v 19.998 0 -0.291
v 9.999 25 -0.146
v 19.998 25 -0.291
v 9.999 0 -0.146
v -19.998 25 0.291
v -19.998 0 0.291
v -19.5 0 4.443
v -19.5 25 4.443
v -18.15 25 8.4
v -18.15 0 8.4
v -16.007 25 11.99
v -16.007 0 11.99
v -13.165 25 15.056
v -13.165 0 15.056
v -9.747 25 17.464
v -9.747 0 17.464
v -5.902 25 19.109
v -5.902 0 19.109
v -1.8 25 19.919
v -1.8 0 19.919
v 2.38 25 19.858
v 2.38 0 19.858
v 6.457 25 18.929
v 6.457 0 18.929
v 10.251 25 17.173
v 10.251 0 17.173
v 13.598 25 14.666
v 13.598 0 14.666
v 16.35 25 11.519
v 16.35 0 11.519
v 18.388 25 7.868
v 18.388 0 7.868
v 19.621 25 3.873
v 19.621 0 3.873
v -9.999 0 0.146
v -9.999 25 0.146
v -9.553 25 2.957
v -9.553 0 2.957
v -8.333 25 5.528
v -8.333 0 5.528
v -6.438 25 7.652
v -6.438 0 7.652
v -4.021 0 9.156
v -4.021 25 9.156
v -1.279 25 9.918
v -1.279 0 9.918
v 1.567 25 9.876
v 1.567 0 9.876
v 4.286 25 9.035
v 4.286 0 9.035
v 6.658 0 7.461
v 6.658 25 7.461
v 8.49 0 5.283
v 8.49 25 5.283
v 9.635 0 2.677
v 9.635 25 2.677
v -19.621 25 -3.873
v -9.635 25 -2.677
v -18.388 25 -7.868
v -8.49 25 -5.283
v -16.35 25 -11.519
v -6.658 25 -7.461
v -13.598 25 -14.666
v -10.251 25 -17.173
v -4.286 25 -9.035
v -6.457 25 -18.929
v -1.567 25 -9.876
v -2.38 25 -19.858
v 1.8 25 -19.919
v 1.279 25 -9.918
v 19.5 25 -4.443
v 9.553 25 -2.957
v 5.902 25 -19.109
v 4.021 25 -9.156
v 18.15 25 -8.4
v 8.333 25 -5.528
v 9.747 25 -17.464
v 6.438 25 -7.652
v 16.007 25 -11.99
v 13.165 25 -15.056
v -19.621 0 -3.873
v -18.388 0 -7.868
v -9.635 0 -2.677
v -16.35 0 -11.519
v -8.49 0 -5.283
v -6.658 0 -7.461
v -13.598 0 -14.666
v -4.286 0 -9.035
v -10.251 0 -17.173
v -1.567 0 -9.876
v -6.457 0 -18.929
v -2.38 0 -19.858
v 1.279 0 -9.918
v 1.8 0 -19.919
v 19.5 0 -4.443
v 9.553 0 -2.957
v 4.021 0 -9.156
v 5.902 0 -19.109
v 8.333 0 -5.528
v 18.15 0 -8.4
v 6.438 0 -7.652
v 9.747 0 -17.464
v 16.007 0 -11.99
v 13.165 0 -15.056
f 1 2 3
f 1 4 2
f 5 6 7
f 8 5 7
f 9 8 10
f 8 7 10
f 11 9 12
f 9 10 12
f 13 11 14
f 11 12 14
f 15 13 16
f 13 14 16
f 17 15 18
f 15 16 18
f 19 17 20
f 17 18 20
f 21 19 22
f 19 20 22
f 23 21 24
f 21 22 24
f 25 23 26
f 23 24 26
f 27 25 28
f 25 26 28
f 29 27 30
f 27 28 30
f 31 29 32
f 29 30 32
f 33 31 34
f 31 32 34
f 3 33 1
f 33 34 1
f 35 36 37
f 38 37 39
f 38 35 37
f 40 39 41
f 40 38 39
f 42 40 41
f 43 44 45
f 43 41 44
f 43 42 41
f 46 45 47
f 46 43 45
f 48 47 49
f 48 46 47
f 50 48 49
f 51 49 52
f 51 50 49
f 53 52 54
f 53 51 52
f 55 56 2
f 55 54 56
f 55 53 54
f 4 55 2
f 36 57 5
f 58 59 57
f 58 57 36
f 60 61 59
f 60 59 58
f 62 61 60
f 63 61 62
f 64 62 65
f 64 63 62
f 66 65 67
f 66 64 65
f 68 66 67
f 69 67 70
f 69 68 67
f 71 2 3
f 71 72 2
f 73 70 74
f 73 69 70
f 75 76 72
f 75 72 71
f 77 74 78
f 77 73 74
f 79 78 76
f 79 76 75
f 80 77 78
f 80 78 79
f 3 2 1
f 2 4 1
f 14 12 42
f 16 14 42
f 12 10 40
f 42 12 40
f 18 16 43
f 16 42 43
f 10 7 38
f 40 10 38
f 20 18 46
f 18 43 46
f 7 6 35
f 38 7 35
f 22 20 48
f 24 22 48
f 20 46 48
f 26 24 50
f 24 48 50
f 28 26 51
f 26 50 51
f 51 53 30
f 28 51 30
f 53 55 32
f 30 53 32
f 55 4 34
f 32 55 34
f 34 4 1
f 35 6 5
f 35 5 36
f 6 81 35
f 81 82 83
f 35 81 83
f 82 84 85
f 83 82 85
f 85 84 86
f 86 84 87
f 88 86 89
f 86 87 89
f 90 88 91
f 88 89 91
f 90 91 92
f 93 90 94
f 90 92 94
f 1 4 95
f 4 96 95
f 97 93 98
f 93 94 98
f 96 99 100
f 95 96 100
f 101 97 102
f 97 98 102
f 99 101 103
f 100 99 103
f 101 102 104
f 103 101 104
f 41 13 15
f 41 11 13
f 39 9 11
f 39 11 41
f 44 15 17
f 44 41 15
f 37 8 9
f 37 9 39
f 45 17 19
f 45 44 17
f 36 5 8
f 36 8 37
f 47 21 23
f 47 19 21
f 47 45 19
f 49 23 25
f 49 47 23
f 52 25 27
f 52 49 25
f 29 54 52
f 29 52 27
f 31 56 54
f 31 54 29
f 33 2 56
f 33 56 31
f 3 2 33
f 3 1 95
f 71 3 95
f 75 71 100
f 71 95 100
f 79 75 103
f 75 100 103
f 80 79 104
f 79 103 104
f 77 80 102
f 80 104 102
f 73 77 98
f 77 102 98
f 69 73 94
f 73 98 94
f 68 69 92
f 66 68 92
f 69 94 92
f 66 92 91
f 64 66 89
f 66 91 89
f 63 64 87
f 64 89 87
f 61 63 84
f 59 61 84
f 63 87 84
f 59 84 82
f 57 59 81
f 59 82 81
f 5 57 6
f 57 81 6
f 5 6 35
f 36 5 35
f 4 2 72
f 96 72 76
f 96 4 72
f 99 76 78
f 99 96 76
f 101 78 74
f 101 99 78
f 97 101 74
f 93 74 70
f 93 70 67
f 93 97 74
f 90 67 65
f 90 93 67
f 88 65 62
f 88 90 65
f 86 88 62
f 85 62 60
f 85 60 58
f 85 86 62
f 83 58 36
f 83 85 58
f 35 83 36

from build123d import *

# Parameters (mm, degrees)
SKETCH1_R              = 20
SKETCH1_R_2            = 10
EXTRUDE_THIN1_DEPTH    = 25
SPLIT1_SURFACE_1_BACK  = 62.847
SPLIT1_SURFACE_1_DEPTH = 125.694
SPLIT1_SURFACE_2_BACK  = 62.847
SPLIT1_SURFACE_2_DEPTH = 125.694


with BuildPart() as part:
    # Sketch1 → Extrude-Thin1 (new body)
    with BuildSketch(Plane(origin=(0, 0, 0), x_dir=(1, 0, 0), z_dir=(0, 1, 0))):
        Circle(SKETCH1_R)
        Circle(SKETCH1_R_2, mode=Mode.SUBTRACT)
    extrude(amount=EXTRUDE_THIN1_DEPTH)


with BuildPart() as body_2:
    # Split1: the piece behind the surface
    add(part.part)
    # Split1 surface: a surface, the sketch's curves swept straight by 125.694 mm
    with BuildLine(Plane(origin=(0, 25, 0), x_dir=(1, 0, 0), z_dir=(0, 1, 0)).offset(-SPLIT1_SURFACE_1_BACK), mode=Mode.PRIVATE) as split1_surface_1_path:
        Line((-26.512584697, -0.386394172), (28.829591237, 0.420162204))
    split1_surface_1 = Shell.extrude(split1_surface_1_path.wire(), (0 * SPLIT1_SURFACE_1_DEPTH, 1 * SPLIT1_SURFACE_1_DEPTH, 0 * SPLIT1_SURFACE_1_DEPTH))
    split(bisect_by=split1_surface_1, keep=Keep.BOTTOM)


with BuildPart() as part_1:
    add(part.part)

    # Split1: split by a surface, the side it looks to stays
    # Split1 surface: a surface, the sketch's curves swept straight by 125.694 mm
    with BuildLine(Plane(origin=(0, 25, 0), x_dir=(1, 0, 0), z_dir=(0, 1, 0)).offset(-SPLIT1_SURFACE_2_BACK), mode=Mode.PRIVATE) as split1_surface_2_path:
        Line((-26.512584697, -0.386394172), (28.829591237, 0.420162204))
    split1_surface_2 = Shell.extrude(split1_surface_2_path.wire(), (0 * SPLIT1_SURFACE_2_DEPTH, 1 * SPLIT1_SURFACE_2_DEPTH, 0 * SPLIT1_SURFACE_2_DEPTH))
    split(bisect_by=split1_surface_2, keep=Keep.TOP)


solid = Compound([body_2.part, part_1.part])
